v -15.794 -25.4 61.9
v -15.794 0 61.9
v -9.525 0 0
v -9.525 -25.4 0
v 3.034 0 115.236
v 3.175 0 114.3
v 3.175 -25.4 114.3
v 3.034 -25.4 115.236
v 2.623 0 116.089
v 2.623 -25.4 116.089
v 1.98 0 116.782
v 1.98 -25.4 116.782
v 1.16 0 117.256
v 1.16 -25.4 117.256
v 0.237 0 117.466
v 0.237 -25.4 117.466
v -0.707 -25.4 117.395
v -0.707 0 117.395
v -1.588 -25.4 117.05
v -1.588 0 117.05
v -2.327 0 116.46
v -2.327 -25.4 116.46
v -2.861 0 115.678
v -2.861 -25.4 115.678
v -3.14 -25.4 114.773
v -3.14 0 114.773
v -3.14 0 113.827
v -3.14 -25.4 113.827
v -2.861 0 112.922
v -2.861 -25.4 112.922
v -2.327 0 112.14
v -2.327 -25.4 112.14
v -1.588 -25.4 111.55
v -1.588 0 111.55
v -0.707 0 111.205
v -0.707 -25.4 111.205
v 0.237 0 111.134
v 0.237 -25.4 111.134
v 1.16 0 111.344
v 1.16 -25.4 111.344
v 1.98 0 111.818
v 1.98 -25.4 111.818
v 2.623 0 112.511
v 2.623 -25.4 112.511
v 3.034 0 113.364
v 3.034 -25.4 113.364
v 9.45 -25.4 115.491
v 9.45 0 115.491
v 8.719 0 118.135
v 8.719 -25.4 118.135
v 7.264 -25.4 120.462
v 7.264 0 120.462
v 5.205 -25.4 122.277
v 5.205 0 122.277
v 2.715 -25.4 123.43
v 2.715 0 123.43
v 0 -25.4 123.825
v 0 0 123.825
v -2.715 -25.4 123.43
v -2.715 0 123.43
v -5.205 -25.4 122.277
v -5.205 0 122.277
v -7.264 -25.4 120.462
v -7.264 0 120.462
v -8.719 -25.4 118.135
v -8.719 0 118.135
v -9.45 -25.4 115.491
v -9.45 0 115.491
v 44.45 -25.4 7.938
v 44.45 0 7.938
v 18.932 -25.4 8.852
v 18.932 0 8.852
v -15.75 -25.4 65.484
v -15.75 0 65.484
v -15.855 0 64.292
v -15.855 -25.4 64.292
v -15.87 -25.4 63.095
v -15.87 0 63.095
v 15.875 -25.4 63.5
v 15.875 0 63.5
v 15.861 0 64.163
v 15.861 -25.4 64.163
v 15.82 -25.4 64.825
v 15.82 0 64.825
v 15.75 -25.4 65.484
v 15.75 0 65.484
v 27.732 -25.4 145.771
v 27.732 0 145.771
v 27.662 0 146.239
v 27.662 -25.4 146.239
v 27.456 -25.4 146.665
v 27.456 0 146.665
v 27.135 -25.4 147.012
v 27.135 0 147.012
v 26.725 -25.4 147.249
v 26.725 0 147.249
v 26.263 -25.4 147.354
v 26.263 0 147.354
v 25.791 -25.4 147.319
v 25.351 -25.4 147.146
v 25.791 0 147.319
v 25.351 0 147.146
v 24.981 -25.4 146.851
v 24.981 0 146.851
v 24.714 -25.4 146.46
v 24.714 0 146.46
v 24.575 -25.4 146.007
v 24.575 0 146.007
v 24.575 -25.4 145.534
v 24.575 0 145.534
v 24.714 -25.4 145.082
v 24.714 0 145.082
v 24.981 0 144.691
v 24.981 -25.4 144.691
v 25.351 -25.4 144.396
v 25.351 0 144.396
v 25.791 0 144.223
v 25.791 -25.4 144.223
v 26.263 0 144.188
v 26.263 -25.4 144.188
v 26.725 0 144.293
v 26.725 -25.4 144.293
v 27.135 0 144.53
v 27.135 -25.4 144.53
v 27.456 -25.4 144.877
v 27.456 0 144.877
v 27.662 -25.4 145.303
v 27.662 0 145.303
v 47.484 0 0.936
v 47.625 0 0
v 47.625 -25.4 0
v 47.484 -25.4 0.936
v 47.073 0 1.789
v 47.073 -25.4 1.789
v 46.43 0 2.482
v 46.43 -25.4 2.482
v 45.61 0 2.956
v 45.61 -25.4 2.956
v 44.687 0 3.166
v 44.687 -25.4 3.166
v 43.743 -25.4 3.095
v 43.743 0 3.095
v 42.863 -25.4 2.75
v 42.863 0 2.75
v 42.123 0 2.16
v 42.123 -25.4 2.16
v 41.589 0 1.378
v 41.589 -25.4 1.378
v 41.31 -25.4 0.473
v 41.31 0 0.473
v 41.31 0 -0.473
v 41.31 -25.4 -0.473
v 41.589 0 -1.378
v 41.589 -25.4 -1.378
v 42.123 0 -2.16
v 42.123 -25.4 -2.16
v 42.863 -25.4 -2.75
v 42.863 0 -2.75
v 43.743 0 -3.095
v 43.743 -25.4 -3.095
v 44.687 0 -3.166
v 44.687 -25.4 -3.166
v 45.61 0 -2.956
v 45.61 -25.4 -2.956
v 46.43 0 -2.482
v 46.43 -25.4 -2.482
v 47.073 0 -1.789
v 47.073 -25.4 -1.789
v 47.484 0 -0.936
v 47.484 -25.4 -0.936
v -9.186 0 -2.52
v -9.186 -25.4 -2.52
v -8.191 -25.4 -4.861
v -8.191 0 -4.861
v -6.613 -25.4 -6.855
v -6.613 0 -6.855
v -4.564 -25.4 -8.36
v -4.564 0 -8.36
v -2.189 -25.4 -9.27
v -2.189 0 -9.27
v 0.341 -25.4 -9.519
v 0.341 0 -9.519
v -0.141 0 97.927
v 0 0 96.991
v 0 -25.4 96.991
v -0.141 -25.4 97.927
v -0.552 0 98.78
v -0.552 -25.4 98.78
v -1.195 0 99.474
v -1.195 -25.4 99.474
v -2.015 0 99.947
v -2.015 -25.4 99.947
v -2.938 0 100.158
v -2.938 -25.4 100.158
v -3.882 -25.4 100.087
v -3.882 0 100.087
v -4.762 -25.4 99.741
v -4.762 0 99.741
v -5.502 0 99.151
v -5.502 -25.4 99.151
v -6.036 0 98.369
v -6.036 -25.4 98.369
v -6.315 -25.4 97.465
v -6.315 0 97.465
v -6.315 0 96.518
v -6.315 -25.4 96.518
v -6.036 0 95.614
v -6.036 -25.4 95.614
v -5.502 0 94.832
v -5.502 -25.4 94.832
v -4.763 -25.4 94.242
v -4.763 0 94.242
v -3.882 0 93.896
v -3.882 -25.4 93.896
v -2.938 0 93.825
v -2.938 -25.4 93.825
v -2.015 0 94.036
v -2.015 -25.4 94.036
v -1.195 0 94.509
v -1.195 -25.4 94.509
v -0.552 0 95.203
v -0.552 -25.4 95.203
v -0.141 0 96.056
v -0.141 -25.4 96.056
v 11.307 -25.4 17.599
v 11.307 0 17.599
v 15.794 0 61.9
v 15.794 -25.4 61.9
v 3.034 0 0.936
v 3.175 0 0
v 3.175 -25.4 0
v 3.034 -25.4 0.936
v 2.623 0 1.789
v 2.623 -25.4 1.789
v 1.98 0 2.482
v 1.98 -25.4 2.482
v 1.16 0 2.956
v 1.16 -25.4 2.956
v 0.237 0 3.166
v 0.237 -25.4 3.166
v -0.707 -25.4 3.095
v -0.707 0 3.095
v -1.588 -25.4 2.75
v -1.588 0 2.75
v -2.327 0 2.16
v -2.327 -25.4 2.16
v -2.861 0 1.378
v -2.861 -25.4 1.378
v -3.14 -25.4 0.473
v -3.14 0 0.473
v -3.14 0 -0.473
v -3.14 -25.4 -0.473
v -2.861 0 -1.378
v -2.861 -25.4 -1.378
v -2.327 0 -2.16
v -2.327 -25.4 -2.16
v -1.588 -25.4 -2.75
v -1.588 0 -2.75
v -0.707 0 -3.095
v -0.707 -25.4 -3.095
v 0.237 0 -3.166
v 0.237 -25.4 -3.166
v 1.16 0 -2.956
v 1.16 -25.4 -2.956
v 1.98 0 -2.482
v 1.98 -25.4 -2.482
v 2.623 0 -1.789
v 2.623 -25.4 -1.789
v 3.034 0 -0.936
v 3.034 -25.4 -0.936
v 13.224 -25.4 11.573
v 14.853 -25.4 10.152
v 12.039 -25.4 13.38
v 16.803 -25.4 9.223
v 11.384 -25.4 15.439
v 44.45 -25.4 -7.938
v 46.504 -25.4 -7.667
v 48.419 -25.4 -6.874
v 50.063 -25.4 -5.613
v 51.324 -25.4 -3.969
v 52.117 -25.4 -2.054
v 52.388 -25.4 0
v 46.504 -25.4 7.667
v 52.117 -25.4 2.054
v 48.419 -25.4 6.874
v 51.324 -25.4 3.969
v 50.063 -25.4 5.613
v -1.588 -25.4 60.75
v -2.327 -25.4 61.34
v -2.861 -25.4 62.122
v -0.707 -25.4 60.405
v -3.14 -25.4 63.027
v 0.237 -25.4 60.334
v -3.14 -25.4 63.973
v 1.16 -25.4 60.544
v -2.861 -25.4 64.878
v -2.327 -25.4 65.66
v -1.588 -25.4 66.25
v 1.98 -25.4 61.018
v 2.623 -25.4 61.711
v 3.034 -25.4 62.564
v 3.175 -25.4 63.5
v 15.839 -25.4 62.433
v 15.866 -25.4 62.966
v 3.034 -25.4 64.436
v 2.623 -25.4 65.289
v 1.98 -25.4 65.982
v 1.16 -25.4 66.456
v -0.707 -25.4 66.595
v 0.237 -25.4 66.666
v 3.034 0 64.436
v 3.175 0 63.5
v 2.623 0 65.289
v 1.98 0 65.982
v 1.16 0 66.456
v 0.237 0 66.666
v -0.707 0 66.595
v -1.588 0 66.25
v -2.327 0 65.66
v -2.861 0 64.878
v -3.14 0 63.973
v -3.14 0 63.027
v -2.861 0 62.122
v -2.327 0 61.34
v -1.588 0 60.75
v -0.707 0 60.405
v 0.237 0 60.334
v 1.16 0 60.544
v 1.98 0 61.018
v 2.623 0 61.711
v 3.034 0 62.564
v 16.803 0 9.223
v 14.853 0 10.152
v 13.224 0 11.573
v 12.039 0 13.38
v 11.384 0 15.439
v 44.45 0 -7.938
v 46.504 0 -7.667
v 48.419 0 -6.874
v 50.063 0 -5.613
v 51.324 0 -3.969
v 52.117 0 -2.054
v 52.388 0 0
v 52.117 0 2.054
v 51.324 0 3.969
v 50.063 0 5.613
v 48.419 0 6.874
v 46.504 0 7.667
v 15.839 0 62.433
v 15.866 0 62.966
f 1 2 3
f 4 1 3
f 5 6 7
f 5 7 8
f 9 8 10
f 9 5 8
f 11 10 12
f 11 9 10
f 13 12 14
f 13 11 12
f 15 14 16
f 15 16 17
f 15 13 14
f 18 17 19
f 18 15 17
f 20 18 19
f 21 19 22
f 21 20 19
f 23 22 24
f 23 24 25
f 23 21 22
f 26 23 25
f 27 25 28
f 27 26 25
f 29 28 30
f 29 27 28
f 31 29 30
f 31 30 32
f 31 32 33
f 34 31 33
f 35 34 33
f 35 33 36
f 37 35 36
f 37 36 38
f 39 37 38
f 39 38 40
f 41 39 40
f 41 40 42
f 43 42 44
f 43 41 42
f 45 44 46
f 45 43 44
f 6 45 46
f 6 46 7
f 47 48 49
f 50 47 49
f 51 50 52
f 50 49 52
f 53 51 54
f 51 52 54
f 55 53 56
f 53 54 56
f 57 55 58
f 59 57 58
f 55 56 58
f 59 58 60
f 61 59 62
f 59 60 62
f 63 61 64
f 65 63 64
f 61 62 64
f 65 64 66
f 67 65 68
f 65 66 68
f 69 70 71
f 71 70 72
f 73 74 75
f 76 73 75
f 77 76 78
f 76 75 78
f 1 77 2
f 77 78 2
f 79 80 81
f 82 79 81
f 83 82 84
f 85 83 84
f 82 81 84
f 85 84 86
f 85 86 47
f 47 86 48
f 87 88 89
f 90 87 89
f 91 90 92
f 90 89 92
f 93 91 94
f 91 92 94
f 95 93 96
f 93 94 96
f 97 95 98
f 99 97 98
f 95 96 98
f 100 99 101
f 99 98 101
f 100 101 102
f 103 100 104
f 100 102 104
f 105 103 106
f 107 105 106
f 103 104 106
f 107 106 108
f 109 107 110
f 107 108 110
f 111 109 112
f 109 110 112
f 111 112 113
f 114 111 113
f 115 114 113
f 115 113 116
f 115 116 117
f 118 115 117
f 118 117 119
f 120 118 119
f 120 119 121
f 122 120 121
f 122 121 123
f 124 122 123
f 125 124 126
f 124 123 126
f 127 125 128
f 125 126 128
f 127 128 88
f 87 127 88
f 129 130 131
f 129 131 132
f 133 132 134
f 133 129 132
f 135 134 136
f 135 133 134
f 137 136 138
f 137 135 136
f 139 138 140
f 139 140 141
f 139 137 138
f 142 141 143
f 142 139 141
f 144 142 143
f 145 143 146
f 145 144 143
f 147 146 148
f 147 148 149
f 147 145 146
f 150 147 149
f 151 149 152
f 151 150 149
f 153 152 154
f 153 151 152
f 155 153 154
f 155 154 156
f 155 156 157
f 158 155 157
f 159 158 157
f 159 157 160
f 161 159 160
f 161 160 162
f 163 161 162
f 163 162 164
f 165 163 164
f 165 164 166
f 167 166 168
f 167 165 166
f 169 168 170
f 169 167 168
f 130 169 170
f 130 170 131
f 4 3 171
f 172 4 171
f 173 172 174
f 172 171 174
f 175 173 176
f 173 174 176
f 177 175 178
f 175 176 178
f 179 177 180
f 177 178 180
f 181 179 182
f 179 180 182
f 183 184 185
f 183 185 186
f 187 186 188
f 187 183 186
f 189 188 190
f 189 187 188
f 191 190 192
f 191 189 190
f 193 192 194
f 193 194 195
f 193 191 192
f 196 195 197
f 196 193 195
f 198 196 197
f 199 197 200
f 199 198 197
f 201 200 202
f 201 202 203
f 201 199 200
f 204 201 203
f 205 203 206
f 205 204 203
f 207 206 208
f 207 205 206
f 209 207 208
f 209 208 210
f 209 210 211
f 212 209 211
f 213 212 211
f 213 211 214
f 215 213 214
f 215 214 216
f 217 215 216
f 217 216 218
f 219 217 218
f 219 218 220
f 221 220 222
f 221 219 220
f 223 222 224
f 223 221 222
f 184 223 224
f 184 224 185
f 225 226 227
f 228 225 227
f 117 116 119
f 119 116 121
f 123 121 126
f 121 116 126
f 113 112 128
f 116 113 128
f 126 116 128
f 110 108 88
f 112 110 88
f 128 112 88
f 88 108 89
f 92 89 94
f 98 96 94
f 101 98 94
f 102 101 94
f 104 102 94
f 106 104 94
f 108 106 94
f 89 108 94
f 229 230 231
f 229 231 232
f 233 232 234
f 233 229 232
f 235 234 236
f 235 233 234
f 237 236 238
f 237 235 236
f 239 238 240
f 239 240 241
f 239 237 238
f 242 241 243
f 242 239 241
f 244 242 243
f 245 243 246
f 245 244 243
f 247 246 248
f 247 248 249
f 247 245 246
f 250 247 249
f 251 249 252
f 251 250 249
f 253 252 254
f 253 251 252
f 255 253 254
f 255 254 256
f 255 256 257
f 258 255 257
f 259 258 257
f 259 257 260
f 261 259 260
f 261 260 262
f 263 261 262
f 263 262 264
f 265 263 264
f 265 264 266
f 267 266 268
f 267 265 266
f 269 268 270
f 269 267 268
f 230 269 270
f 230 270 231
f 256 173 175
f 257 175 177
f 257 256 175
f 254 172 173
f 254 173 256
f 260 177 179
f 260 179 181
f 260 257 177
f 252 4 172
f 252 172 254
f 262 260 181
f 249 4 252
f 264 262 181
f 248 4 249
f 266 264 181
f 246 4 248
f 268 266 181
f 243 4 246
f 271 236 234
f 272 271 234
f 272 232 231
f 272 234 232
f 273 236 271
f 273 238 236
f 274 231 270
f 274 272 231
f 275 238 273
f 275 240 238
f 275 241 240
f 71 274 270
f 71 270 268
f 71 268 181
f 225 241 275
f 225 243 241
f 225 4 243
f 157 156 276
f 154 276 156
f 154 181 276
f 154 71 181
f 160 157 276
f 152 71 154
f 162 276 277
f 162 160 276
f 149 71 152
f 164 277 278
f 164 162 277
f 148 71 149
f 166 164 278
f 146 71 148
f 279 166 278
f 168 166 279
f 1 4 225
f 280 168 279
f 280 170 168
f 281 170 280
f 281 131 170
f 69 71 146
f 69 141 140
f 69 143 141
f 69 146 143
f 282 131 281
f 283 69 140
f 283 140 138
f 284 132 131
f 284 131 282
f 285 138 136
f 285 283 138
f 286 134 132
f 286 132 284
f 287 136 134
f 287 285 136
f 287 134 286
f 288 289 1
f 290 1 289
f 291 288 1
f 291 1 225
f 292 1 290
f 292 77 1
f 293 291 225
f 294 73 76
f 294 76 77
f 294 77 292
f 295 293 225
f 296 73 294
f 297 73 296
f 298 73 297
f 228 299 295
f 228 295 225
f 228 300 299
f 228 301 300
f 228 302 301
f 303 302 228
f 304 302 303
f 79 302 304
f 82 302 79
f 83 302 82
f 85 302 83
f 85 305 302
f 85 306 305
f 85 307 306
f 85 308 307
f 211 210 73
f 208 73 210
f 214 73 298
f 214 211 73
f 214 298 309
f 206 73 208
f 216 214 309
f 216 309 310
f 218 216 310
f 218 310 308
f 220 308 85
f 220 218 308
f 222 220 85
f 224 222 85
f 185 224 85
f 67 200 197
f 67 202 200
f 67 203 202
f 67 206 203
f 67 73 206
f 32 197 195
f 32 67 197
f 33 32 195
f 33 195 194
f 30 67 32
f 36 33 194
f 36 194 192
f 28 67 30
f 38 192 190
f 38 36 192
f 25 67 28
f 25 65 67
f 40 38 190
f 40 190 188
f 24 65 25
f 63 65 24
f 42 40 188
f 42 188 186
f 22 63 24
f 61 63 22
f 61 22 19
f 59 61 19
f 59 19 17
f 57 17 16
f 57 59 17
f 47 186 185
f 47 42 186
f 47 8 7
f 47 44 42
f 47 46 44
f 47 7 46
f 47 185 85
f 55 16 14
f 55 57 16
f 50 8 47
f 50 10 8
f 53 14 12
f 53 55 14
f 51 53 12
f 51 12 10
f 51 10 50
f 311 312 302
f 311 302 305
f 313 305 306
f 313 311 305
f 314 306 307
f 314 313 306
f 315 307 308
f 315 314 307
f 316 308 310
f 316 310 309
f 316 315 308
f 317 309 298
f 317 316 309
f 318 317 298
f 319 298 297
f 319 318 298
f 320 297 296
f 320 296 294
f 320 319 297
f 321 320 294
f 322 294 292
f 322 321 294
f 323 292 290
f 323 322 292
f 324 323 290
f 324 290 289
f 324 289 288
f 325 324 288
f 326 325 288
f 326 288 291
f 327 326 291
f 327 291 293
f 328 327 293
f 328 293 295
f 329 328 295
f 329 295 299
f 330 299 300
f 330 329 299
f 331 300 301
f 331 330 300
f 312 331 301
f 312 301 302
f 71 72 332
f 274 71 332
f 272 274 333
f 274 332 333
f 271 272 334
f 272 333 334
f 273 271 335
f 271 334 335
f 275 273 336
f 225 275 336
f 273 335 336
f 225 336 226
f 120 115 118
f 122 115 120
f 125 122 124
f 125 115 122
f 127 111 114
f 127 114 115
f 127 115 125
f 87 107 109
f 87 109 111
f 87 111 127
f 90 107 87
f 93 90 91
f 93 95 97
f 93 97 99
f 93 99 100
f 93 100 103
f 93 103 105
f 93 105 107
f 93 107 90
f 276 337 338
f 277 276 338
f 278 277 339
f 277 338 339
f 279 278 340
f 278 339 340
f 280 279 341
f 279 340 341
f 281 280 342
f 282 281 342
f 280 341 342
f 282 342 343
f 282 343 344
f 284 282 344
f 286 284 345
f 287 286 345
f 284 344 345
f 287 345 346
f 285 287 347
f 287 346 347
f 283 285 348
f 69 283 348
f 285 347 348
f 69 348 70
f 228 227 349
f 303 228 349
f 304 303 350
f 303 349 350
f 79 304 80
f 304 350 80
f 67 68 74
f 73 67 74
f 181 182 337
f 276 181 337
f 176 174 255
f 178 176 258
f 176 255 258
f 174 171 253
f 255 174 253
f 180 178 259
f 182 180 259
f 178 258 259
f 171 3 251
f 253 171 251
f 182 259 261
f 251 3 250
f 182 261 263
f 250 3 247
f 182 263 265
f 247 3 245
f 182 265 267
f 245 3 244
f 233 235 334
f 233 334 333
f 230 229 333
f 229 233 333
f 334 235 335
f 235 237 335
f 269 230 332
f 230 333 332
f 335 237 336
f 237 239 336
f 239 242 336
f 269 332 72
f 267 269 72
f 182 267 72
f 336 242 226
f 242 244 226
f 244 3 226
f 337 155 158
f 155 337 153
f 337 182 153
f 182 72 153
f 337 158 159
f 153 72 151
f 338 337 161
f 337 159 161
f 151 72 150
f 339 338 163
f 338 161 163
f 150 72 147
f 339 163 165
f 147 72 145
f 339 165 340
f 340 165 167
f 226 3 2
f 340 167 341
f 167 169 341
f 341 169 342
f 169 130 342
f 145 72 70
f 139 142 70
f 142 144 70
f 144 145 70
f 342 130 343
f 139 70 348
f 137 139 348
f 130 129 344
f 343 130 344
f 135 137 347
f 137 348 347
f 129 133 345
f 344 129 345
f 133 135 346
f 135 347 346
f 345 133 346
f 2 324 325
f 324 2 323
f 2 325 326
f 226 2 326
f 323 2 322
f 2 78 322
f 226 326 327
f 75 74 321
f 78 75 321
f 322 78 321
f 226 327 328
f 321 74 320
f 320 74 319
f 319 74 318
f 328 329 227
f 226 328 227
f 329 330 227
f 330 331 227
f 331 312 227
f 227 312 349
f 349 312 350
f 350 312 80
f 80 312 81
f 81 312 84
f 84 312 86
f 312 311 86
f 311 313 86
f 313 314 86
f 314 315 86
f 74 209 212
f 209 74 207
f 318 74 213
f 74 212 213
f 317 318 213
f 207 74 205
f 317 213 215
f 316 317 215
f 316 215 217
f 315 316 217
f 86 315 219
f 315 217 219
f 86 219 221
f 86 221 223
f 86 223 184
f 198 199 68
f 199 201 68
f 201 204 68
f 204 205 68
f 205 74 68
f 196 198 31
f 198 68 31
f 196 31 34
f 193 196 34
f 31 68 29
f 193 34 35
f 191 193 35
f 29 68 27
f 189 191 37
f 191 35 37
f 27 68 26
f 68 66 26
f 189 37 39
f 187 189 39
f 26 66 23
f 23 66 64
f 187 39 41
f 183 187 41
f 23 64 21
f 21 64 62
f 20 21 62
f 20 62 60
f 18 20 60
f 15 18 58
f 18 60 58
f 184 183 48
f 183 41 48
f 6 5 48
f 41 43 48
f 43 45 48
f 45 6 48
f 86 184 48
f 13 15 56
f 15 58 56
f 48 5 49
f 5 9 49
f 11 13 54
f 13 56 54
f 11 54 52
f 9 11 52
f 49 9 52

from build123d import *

# Parameters (mm, degrees)
F0_R     = 3.175
F0_R_2   = 1.5875
F1_DEPTH = 25.4


with BuildPart() as f1:
    # F0 (on Front) → F1 (new body)
    with BuildSketch(Plane.XZ):
        with BuildLine():
            ThreePointArc((-9.450293, 115.490625), (-0.596483, 104.793695), (9.525, 114.3))
            ThreePointArc((9.525, 114.3), (9.506305, 114.896483), (9.450293, 115.490625))
            ThreePointArc((9.450293, 115.490625), (0, 123.825), (-9.450293, 115.490625))
        make_face()
        with Locations((0, 114.3)):
            Circle(F0_R, mode=Mode.SUBTRACT)
        with BuildLine():
            ThreePointArc((9.450293, 115.490625), (9.506305, 114.896483), (9.525, 114.3))
            ThreePointArc((9.525, 114.3), (-0.596483, 104.793695), (-9.450293, 115.490625))
            Line((-9.450293, 115.490625), (-15.750488, 65.484375))
            ThreePointArc((-15.750488, 65.484375), (0, 79.375), (15.750488, 65.484375))
            Line((15.750488, 65.484375), (9.450293, 115.490625))
        make_face()
        with Locations((-3.175, 96.99142)):
            Circle(F0_R, mode=Mode.SUBTRACT)
        with BuildLine():
            ThreePointArc((15.875, 63.5), (15.843841, 64.494139), (15.750488, 65.484375))
            ThreePointArc((15.750488, 65.484375), (0, 79.375), (-15.750488, 65.484375))
            ThreePointArc((-15.750488, 65.484375), (-15.873819, 63.693615), (-15.794203, 61.90038))
            ThreePointArc((-15.794203, 61.90038), (0, 47.625), (15.794203, 61.90038))
            ThreePointArc((15.794203, 61.90038), (15.854788, 62.699171), (15.875, 63.5))
        make_face()
        with Locations((0, 63.5)):
            Circle(F0_R, mode=Mode.SUBTRACT)
        with BuildLine():
            ThreePointArc((15.794203, 61.90038), (0, 47.625), (-15.794203, 61.90038))
            Line((-15.794203, 61.90038), (-9.525, 0))
            ThreePointArc((-9.525, 0), (0, 9.525), (9.525, 0))
            ThreePointArc((9.525, 0), (6.854788, -6.613434), (0.341271, -9.518884))
            Line((0.341271, -9.518884), (44.45, -7.9375))
            ThreePointArc((44.45, -7.9375), (36.5125, 0), (44.45, 7.9375))
            Line((44.45, 7.9375), (18.932251, 8.852361))
            ThreePointArc((18.932251, 8.852361), (13.224458, 11.573096), (11.307362, 17.598546))
            Line((11.307362, 17.598546), (15.794203, 61.90038))
        make_face()
        with BuildLine():
            ThreePointArc((9.525, 0), (0, 9.525), (-9.525, 0))
            ThreePointArc((-9.525, 0), (-6.613434, -6.854788), (0.341271, -9.518884))
            ThreePointArc((0.341271, -9.518884), (6.854788, -6.613434), (9.525, 0))
        make_face()
        Circle(F0_R, mode=Mode.SUBTRACT)
        with BuildLine():
            ThreePointArc((44.45, 7.9375), (36.5125, 0), (44.45, -7.9375))
            ThreePointArc((44.45, -7.9375), (50.06266, -5.61266), (52.3875, 0))
            ThreePointArc((52.3875, 0), (50.06266, 5.61266), (44.45, 7.9375))
        make_face()
        with Locations((44.45, 0)):
            Circle(F0_R, mode=Mode.SUBTRACT)
        with Locations((26.144724, 145.770863)):
            Circle(F0_R_2)
    extrude(amount=F1_DEPTH)


solid = f1.part
